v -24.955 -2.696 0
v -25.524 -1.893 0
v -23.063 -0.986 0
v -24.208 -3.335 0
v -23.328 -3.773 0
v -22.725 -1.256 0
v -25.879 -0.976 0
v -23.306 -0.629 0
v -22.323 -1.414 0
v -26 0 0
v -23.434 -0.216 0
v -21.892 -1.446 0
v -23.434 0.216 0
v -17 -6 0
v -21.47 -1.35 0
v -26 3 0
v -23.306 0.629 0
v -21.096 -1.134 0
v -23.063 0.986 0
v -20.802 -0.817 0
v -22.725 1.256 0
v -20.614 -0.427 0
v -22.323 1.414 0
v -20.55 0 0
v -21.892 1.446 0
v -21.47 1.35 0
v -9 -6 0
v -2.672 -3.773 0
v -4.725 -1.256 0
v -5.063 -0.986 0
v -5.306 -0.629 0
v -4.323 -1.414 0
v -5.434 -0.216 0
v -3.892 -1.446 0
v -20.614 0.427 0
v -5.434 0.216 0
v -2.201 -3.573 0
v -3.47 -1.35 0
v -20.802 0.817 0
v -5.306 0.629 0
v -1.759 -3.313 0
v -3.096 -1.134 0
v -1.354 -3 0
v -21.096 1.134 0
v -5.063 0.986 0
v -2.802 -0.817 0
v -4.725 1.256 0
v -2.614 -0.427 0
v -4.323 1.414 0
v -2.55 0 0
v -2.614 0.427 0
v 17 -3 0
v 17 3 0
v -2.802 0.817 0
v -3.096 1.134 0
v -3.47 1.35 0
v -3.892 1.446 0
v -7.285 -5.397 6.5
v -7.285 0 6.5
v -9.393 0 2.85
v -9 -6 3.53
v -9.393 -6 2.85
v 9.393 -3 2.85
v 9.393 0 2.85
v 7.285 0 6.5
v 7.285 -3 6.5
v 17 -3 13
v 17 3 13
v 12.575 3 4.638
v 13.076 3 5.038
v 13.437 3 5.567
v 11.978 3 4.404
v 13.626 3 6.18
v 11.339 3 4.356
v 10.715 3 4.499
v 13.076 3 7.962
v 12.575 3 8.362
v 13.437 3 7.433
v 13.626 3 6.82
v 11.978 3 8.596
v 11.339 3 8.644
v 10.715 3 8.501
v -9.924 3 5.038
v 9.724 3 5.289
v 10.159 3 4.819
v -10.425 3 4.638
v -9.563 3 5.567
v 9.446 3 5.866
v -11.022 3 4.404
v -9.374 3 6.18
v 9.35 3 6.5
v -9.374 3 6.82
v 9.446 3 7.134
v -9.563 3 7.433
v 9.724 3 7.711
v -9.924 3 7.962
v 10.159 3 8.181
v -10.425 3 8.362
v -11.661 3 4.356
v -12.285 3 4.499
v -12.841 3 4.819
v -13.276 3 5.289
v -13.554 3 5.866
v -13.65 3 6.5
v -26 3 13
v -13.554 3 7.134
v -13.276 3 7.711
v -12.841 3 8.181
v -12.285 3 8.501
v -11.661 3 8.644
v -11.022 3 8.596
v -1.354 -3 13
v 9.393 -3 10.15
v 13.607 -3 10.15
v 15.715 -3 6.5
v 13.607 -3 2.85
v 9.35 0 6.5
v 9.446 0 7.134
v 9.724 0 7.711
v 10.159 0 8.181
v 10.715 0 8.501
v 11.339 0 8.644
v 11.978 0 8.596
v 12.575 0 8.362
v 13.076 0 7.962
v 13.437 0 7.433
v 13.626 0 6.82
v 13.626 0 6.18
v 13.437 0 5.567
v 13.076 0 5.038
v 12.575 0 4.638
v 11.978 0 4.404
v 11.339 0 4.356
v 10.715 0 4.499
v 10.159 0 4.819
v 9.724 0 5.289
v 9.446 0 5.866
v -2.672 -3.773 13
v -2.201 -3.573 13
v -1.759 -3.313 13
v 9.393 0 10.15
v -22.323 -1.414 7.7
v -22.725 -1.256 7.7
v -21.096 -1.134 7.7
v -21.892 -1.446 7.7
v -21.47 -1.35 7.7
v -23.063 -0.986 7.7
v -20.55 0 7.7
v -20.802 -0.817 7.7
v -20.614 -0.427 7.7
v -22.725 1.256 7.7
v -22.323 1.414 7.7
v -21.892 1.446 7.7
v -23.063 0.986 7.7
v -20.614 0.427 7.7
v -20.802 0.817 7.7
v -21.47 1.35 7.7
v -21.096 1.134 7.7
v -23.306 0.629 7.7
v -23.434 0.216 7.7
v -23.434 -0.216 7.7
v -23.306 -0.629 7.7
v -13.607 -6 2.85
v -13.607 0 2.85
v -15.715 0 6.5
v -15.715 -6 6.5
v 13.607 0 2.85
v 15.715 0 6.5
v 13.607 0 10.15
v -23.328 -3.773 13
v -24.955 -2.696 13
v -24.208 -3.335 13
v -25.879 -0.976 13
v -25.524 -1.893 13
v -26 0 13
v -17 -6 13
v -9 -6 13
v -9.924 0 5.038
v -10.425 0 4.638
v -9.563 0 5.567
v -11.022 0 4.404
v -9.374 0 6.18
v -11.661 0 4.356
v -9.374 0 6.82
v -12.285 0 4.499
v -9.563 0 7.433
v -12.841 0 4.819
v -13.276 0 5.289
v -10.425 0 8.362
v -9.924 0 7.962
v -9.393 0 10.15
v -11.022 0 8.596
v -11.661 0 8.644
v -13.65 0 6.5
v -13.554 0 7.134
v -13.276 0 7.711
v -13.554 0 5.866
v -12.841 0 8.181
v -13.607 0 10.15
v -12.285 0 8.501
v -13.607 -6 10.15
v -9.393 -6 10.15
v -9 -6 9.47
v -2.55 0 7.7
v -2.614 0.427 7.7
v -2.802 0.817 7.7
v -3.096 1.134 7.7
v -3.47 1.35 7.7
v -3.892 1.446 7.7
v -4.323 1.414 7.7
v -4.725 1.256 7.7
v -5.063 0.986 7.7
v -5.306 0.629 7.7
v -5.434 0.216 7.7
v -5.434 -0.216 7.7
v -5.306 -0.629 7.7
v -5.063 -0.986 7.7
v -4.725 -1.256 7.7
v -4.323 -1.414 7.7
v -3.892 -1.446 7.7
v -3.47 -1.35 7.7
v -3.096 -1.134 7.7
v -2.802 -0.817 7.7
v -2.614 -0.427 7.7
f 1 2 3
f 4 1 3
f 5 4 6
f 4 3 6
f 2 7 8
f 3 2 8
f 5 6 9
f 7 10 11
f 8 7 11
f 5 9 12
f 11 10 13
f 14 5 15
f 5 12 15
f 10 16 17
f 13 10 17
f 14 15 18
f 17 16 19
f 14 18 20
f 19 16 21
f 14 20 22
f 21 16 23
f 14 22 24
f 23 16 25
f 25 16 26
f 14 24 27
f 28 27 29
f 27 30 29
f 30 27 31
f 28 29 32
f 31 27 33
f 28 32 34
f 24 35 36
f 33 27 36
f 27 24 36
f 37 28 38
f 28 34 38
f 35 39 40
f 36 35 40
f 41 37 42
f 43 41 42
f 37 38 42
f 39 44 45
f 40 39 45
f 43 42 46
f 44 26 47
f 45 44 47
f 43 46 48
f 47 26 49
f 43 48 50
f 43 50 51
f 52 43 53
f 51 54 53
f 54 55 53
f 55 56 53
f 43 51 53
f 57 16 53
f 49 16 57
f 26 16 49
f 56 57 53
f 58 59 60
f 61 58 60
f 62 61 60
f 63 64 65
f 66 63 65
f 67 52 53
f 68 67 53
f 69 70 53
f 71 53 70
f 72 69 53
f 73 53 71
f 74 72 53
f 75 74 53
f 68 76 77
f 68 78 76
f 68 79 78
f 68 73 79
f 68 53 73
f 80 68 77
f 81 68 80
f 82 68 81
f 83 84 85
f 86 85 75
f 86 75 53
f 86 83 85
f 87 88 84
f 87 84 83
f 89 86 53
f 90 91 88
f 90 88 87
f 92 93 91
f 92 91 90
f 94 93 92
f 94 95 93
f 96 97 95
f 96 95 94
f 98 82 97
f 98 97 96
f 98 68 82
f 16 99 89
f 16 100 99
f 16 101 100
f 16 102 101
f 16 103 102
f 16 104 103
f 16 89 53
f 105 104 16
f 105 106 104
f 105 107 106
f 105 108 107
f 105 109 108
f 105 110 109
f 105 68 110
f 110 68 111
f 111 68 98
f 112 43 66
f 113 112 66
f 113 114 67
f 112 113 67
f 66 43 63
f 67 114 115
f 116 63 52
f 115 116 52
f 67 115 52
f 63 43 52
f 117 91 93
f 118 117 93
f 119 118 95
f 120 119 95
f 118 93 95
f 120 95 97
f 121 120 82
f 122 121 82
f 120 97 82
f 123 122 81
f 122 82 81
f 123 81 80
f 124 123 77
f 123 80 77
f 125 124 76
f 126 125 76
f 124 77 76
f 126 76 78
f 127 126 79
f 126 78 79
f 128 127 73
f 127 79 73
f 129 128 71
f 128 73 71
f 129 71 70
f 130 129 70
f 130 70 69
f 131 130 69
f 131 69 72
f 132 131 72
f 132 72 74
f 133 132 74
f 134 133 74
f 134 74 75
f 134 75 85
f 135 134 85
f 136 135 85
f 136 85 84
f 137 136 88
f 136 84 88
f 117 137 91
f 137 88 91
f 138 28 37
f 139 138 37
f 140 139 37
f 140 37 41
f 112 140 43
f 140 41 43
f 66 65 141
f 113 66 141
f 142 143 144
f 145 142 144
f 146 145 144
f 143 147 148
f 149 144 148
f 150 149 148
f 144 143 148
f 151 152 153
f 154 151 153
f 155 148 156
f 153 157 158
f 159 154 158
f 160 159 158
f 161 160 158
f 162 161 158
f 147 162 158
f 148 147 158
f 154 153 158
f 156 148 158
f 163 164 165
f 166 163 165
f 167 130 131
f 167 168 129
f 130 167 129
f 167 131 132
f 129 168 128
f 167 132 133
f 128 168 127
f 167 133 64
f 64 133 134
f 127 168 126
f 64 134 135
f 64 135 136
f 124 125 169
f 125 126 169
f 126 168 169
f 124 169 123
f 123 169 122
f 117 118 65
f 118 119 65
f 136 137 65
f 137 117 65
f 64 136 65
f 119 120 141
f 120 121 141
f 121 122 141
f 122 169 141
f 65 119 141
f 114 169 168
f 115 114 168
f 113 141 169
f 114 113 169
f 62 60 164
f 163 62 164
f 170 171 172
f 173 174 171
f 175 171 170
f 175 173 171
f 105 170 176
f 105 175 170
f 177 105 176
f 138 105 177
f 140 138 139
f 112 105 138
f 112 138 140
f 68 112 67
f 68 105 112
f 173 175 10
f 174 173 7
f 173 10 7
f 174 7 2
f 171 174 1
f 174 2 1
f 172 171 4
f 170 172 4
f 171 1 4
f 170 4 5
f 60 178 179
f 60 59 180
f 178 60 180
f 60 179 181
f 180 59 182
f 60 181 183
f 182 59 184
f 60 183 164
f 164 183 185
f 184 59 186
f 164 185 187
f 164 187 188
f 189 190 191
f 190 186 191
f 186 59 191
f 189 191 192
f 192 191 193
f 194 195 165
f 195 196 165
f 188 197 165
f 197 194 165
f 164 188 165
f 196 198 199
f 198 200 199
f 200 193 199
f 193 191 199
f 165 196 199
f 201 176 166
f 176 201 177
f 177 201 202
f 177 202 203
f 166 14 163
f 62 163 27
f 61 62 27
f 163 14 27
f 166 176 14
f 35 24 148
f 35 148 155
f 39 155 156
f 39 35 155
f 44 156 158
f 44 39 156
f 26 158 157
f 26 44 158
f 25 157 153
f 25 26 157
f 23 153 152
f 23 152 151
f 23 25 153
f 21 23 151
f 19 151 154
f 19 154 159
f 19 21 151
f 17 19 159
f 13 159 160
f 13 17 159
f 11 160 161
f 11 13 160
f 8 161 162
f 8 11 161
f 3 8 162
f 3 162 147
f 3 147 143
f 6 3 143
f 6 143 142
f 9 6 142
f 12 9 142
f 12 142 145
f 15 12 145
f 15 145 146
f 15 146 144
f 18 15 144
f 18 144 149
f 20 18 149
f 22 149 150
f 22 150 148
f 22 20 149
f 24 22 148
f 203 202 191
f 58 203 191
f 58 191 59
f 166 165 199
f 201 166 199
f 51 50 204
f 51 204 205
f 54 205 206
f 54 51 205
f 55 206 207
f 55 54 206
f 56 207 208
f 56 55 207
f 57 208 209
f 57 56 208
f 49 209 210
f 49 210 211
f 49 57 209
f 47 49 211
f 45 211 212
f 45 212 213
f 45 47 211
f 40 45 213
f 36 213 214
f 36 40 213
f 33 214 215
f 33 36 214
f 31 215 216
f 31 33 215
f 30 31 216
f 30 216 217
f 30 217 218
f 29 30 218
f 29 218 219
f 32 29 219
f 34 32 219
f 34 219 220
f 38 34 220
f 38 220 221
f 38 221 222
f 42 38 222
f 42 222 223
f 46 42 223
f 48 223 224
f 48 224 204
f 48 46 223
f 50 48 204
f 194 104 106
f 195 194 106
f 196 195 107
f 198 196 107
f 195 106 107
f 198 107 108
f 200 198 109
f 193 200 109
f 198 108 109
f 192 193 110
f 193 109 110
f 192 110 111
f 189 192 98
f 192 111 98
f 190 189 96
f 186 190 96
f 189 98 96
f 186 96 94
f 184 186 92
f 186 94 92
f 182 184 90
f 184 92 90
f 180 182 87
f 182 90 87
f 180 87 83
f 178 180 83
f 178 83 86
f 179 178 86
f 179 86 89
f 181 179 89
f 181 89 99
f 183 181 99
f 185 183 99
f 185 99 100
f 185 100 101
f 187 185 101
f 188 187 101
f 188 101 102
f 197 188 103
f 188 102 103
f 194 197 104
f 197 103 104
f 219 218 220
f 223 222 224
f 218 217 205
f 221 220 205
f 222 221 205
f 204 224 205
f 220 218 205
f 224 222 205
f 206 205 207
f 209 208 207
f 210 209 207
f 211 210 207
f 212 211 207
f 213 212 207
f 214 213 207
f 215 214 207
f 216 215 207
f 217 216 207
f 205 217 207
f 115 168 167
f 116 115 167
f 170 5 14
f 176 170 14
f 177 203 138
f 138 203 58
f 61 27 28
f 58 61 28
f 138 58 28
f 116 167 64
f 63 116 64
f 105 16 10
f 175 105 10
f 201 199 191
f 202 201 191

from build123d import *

# Parameters (mm, degrees)
F0_R     = 1.45
F1_DEPTH = 13
F2_R     = 2.15
F3_DEPTH = 9.001
F4_DEPTH = 3
F5_DEPTH = 7.7


with BuildPart() as f1:
    # F0 (on Top) → F1 (new body)
    with BuildSketch(Plane.XY):
        with BuildLine():
            Line((17, -3), (17, 3))
            Line((17, 3), (-26, 3))
            Line((-26, 3), (-26, 0))
            ThreePointArc((-26, 0), (-25.2642971497, -2.3117880782), (-23.3278179407, -3.7731816172))
            Line((-23.3278179407, -3.7731816172), (-17, -6))
            Line((-17, -6), (-9, -6))
            Line((-9, -6), (-2.6721820593, -3.7731816172))
            ThreePointArc((-2.6721820593, -3.7731816172), (-1.9759531619, -3.4501064327), (-1.3542486889, -3))
            Line((-1.3542486889, -3), (17, -3))
        make_face()
        with Locations((-22, 0)):
            Circle(F0_R, mode=Mode.SUBTRACT)
        with Locations((-4, 0)):
            Circle(F0_R, mode=Mode.SUBTRACT)
        with Locations((-22, 0)):
            Circle(F0_R)
        with Locations((-4, 0)):
            Circle(F0_R)
    extrude(amount=F1_DEPTH)

    # F2 (on face) → F3 (cut, through all)
    with BuildSketch(Plane(origin=(0, 3, 0), x_dir=(-1, 0, 0), z_dir=(0, 1, 0))):
        Polygon((-9.3926715175, 10.15), (-13.6073284825, 10.15), (-15.7146569651, 6.5), (-13.6073284825, 2.85), (-9.3926715175, 2.85), (-7.2853430349, 6.5), align=None)
        with Locations((-11.5, 6.5)):
            Circle(F2_R, mode=Mode.SUBTRACT)
        Polygon((7.2853430349, 6.5), (9.3926715175, 2.85), (13.6073284825, 2.85), (15.7146569651, 6.5), (13.6073284825, 10.15), (9.3926715175, 10.15), align=None)
        with Locations((11.5, 6.5)):
            Circle(F2_R, mode=Mode.SUBTRACT)
        with Locations((-11.5, 6.5)):
            Circle(F2_R)
        with Locations((11.5, 6.5)):
            Circle(F2_R)
    extrude(amount=-F3_DEPTH, mode=Mode.SUBTRACT)

    # F2 (on face) → F4 (join)
    with BuildSketch(Plane(origin=(0, 3, 0), x_dir=(-1, 0, 0), z_dir=(0, 1, 0))):
        Polygon((-9.3926715175, 10.15), (-13.6073284825, 10.15), (-15.7146569651, 6.5), (-13.6073284825, 2.85), (-9.3926715175, 2.85), (-7.2853430349, 6.5), align=None)
        with Locations((-11.5, 6.5)):
            Circle(F2_R, mode=Mode.SUBTRACT)
        Polygon((7.2853430349, 6.5), (9.3926715175, 2.85), (13.6073284825, 2.85), (15.7146569651, 6.5), (13.6073284825, 10.15), (9.3926715175, 10.15), align=None)
        with Locations((11.5, 6.5)):
            Circle(F2_R, mode=Mode.SUBTRACT)
    extrude(amount=-F4_DEPTH)

    # F0 (on Top) → F5 (cut)
    with BuildSketch(Plane.XY):
        with Locations((-4, 0)):
            Circle(F0_R)
        with Locations((-22, 0)):
            Circle(F0_R)
    extrude(amount=F5_DEPTH, mode=Mode.SUBTRACT)


solid = f1.part
